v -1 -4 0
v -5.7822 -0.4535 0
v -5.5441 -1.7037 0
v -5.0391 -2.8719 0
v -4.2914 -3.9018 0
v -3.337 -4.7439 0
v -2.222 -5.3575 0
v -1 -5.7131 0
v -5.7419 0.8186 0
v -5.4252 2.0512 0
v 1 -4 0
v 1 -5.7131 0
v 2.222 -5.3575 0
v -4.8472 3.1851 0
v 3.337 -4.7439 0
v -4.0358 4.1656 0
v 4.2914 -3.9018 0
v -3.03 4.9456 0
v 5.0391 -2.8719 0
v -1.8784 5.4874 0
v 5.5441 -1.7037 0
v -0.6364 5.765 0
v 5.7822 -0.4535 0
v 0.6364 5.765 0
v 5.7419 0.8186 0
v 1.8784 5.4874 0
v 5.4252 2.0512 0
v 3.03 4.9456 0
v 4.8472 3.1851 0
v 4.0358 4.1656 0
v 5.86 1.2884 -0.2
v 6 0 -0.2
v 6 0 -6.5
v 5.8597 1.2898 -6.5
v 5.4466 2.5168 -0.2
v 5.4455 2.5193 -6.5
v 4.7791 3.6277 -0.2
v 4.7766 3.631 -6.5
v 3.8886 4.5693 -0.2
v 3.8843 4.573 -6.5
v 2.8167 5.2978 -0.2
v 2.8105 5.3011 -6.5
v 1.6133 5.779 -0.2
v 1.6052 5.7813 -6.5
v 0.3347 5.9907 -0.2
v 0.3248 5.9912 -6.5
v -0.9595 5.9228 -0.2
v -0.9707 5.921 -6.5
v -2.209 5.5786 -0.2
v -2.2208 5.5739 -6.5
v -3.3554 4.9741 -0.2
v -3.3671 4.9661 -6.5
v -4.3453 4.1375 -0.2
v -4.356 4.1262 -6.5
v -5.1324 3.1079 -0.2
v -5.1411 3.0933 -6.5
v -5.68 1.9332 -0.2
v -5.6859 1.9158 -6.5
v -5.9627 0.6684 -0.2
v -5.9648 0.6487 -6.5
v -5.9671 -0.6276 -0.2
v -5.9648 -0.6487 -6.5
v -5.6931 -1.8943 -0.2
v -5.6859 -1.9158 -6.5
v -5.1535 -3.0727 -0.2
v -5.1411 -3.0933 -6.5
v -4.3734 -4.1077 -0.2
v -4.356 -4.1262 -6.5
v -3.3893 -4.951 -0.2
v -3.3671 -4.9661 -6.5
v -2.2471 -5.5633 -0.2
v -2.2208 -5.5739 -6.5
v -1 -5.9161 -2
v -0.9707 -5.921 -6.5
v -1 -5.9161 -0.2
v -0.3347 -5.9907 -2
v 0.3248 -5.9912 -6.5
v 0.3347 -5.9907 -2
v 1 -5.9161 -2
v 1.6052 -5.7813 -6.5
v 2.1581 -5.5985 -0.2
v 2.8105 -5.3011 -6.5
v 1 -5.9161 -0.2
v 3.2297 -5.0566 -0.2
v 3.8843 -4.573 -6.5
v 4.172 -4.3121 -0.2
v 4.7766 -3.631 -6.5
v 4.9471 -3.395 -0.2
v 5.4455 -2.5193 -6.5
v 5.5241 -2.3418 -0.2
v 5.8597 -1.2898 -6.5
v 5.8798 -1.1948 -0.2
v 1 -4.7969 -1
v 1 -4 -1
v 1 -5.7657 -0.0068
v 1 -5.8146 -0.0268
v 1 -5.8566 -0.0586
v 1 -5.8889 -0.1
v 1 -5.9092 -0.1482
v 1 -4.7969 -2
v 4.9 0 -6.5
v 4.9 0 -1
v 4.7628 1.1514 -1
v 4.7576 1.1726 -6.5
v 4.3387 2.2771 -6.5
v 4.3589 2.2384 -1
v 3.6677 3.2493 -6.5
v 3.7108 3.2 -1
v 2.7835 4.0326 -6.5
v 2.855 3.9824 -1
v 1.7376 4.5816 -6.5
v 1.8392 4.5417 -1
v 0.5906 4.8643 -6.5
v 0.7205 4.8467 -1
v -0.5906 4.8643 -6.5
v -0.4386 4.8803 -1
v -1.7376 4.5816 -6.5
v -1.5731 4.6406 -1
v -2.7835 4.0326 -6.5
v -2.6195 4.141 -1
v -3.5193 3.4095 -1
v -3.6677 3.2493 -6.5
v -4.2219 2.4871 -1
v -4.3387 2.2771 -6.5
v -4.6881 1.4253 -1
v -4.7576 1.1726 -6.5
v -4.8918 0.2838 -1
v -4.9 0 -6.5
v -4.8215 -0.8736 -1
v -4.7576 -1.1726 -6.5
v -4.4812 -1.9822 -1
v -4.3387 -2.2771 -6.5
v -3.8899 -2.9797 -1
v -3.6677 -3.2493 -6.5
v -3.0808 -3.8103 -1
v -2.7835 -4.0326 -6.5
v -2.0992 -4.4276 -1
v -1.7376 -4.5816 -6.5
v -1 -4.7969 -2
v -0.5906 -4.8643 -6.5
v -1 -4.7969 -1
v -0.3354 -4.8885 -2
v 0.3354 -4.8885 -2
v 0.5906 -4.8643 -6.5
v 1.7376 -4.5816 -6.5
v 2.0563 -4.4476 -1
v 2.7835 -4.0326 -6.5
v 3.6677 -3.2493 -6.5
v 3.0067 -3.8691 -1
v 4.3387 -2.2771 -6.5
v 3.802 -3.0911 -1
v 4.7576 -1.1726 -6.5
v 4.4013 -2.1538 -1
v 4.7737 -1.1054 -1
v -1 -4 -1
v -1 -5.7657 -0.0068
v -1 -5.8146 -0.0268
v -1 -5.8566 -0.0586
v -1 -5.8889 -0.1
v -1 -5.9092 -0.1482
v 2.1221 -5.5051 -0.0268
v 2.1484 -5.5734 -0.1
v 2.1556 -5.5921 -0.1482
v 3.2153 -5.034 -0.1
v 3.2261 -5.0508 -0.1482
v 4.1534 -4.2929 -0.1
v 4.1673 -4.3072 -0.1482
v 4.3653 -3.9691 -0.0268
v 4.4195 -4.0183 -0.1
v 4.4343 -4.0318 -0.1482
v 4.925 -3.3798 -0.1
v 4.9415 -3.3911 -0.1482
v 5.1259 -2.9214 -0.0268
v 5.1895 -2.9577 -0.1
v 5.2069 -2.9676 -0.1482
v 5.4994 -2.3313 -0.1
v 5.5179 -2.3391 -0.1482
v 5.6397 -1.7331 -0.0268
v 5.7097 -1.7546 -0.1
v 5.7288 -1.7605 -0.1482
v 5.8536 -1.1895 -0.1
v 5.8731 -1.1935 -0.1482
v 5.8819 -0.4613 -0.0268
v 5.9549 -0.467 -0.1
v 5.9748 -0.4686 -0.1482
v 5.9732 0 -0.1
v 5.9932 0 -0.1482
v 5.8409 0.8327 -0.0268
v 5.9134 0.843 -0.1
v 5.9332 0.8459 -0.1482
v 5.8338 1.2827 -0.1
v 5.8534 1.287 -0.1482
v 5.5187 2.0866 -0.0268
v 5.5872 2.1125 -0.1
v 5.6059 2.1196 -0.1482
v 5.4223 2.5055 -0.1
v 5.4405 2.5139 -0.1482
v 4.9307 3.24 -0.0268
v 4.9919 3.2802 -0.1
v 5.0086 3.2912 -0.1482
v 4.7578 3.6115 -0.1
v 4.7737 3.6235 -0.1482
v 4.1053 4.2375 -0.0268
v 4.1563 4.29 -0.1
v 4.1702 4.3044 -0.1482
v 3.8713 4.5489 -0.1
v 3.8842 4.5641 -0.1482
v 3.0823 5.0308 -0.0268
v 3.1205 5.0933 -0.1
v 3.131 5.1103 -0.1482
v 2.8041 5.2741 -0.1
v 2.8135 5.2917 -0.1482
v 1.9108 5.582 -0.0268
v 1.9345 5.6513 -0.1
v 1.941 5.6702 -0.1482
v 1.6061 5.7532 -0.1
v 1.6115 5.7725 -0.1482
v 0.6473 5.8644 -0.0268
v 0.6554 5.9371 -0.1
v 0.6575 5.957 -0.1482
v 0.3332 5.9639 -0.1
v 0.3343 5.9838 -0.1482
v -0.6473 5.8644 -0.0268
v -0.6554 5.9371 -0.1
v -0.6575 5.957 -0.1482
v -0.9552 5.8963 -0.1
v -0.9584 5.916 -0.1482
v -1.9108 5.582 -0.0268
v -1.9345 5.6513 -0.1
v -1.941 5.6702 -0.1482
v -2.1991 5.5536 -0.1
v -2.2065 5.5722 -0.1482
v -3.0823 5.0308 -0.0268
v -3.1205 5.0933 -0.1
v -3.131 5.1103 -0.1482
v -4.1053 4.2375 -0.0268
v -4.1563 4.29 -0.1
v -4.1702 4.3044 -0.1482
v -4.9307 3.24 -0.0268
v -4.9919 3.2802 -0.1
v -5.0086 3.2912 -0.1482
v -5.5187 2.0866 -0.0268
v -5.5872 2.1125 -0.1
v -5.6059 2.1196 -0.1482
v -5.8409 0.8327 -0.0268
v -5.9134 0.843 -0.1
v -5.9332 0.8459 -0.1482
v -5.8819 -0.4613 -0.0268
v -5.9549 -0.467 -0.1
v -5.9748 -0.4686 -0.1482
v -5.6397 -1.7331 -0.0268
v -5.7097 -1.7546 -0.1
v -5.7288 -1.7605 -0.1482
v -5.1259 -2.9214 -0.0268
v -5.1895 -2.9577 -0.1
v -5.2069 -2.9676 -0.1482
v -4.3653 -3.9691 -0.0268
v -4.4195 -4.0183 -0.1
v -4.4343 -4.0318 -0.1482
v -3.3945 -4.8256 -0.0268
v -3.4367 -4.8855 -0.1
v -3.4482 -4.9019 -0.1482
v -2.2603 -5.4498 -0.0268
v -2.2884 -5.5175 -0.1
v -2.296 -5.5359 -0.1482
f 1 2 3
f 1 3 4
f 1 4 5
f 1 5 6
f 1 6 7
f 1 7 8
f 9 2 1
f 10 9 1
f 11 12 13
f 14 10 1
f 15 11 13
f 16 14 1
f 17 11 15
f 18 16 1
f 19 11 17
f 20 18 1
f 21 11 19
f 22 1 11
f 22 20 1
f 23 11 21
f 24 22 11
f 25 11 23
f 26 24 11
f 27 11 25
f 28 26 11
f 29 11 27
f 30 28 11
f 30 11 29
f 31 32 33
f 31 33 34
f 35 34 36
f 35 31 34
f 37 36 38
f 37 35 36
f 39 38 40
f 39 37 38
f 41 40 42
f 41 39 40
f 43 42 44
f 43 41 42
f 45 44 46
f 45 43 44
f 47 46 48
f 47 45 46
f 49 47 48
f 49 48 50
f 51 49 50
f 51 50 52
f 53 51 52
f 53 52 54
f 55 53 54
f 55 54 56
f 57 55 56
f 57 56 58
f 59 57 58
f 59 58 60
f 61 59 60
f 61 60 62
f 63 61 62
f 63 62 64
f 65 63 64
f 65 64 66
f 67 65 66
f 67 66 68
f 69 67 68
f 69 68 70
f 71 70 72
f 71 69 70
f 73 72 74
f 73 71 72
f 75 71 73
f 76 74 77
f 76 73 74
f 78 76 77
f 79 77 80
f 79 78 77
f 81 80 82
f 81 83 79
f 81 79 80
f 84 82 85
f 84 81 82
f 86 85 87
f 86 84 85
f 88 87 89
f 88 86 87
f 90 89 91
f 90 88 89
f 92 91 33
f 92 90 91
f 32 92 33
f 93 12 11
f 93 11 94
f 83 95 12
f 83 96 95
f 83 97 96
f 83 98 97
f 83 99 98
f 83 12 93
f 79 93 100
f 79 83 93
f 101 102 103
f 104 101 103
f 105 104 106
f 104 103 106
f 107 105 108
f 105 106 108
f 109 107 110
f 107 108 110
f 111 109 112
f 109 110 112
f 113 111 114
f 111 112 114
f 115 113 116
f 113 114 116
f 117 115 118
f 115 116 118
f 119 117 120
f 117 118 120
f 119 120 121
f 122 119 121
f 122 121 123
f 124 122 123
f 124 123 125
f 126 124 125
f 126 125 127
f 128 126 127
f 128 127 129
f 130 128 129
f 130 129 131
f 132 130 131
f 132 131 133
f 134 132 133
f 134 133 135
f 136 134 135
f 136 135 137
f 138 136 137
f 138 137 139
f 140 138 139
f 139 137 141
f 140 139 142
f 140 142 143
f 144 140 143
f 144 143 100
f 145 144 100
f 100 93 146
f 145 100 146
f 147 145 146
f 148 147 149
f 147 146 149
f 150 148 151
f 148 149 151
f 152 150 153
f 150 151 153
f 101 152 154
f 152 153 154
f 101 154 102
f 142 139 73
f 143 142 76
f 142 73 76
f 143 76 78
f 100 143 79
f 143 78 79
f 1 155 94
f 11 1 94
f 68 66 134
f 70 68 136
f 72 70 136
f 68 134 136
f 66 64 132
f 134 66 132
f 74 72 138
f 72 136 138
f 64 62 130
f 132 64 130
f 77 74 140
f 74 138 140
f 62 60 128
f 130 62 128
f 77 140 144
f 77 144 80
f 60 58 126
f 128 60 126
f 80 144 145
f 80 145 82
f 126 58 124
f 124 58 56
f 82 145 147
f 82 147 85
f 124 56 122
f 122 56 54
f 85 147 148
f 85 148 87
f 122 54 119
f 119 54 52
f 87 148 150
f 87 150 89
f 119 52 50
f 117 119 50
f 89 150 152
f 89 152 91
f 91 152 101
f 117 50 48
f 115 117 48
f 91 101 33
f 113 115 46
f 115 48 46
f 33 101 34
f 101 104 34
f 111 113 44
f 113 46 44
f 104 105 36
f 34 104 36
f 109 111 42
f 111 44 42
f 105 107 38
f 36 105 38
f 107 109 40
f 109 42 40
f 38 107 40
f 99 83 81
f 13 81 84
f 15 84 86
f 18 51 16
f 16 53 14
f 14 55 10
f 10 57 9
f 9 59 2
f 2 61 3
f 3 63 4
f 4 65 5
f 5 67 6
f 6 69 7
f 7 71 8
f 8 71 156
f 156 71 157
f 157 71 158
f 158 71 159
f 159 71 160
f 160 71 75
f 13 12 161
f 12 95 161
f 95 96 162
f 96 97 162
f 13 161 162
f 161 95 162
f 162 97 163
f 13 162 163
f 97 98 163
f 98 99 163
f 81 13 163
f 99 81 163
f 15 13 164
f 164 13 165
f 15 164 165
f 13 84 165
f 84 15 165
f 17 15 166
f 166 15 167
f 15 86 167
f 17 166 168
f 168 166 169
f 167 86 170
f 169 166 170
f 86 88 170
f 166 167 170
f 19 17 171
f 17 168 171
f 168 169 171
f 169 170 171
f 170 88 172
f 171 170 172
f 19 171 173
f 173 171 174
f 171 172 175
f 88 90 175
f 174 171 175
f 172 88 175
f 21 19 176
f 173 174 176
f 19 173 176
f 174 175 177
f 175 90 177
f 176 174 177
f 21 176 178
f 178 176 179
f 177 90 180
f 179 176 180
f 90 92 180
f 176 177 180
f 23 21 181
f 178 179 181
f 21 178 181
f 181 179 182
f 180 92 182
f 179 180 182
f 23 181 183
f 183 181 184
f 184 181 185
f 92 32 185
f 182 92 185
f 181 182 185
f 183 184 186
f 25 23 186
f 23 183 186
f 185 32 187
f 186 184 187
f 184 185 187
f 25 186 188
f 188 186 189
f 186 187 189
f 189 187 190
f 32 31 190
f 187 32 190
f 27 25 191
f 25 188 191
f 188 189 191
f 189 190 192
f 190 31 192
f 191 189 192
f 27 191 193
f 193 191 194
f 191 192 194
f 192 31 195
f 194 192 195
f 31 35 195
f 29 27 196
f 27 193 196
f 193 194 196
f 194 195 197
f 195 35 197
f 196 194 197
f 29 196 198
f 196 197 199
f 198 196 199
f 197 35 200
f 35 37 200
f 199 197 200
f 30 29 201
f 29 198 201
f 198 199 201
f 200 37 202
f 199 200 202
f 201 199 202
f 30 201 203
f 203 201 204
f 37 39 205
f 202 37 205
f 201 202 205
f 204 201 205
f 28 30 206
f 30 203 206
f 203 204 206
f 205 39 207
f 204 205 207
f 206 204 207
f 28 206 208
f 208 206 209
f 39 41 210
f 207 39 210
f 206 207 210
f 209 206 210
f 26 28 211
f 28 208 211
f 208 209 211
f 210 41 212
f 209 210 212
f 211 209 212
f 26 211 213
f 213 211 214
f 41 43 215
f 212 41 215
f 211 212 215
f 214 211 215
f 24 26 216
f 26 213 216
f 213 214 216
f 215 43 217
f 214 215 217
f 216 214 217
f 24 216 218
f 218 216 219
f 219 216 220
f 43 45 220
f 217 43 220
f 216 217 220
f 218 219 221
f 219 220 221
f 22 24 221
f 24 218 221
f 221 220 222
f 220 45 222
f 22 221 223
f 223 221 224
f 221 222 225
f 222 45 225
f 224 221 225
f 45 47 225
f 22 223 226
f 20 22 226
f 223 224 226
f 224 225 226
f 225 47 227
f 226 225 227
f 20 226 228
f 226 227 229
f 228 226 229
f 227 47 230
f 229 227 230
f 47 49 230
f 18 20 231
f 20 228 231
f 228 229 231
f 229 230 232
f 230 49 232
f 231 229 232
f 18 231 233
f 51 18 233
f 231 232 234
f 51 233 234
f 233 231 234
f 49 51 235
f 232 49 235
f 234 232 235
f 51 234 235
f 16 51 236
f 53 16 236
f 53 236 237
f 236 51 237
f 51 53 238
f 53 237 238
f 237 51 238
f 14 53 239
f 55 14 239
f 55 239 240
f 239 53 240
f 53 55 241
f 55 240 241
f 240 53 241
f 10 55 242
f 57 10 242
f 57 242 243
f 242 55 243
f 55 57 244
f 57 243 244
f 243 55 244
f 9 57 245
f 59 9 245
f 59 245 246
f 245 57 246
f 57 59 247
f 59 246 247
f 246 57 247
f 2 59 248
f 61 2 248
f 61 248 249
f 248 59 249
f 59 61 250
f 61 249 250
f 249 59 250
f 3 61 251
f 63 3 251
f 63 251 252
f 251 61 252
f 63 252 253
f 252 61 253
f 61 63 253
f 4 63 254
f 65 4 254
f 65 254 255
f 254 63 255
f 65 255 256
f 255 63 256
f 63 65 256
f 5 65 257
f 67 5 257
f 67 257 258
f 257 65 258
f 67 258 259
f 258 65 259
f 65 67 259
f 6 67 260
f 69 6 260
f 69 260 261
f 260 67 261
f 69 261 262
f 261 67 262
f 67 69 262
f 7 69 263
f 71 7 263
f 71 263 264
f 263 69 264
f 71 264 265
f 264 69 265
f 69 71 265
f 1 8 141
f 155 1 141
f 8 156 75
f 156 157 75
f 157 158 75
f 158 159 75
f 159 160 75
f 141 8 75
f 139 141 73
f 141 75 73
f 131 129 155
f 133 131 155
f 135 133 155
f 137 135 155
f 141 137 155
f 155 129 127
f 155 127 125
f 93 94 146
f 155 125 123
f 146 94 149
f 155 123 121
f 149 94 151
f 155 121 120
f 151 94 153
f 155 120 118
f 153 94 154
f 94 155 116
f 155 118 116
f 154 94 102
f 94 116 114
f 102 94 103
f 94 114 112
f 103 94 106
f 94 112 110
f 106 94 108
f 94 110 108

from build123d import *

# Parameters (mm, degrees)
SKETCH_1_R          = 6
SKETCH_1_R_2        = 4.9
EXTRUDE_1_DEPTH     = 6.5
SKETCH_1_2_R        = 4.9
EXTRUDE_2_DEPTH     = 1
FILLET_2_R          = 0.2
SKETCH_8_W          = 2
SKETCH_8_H          = 2
CUT_EXTRUDE_2_DEPTH = 2


with BuildPart() as part:
    # Sketch 1 → Extrude 1 (new body)
    with BuildSketch(Plane.XY):
        Circle(SKETCH_1_R)
        Circle(SKETCH_1_R_2, mode=Mode.SUBTRACT)
    extrude(amount=-EXTRUDE_1_DEPTH)

    # Sketch 1_2 → Extrude 2 (add)
    with BuildSketch(Plane.XY):
        Circle(SKETCH_1_2_R)
    extrude(amount=-EXTRUDE_2_DEPTH)

    # Fillet 2
    fillet_2_edges = [part.edges().sort_by_distance(p)[0] for p in [
        (-6, 0, 0),
    ]]
    fillet(fillet_2_edges, radius=FILLET_2_R)

    # Sketch 8 → Cut-Extrude 2 (cut)
    with BuildSketch(Plane(origin=(0, -6, 0), x_dir=(1, 0, 0), z_dir=(0, 1, 0))):
        with Locations((0, 1)):
            Rectangle(SKETCH_8_W, SKETCH_8_H)
    extrude(amount=CUT_EXTRUDE_2_DEPTH, mode=Mode.SUBTRACT)


solid = part.part
